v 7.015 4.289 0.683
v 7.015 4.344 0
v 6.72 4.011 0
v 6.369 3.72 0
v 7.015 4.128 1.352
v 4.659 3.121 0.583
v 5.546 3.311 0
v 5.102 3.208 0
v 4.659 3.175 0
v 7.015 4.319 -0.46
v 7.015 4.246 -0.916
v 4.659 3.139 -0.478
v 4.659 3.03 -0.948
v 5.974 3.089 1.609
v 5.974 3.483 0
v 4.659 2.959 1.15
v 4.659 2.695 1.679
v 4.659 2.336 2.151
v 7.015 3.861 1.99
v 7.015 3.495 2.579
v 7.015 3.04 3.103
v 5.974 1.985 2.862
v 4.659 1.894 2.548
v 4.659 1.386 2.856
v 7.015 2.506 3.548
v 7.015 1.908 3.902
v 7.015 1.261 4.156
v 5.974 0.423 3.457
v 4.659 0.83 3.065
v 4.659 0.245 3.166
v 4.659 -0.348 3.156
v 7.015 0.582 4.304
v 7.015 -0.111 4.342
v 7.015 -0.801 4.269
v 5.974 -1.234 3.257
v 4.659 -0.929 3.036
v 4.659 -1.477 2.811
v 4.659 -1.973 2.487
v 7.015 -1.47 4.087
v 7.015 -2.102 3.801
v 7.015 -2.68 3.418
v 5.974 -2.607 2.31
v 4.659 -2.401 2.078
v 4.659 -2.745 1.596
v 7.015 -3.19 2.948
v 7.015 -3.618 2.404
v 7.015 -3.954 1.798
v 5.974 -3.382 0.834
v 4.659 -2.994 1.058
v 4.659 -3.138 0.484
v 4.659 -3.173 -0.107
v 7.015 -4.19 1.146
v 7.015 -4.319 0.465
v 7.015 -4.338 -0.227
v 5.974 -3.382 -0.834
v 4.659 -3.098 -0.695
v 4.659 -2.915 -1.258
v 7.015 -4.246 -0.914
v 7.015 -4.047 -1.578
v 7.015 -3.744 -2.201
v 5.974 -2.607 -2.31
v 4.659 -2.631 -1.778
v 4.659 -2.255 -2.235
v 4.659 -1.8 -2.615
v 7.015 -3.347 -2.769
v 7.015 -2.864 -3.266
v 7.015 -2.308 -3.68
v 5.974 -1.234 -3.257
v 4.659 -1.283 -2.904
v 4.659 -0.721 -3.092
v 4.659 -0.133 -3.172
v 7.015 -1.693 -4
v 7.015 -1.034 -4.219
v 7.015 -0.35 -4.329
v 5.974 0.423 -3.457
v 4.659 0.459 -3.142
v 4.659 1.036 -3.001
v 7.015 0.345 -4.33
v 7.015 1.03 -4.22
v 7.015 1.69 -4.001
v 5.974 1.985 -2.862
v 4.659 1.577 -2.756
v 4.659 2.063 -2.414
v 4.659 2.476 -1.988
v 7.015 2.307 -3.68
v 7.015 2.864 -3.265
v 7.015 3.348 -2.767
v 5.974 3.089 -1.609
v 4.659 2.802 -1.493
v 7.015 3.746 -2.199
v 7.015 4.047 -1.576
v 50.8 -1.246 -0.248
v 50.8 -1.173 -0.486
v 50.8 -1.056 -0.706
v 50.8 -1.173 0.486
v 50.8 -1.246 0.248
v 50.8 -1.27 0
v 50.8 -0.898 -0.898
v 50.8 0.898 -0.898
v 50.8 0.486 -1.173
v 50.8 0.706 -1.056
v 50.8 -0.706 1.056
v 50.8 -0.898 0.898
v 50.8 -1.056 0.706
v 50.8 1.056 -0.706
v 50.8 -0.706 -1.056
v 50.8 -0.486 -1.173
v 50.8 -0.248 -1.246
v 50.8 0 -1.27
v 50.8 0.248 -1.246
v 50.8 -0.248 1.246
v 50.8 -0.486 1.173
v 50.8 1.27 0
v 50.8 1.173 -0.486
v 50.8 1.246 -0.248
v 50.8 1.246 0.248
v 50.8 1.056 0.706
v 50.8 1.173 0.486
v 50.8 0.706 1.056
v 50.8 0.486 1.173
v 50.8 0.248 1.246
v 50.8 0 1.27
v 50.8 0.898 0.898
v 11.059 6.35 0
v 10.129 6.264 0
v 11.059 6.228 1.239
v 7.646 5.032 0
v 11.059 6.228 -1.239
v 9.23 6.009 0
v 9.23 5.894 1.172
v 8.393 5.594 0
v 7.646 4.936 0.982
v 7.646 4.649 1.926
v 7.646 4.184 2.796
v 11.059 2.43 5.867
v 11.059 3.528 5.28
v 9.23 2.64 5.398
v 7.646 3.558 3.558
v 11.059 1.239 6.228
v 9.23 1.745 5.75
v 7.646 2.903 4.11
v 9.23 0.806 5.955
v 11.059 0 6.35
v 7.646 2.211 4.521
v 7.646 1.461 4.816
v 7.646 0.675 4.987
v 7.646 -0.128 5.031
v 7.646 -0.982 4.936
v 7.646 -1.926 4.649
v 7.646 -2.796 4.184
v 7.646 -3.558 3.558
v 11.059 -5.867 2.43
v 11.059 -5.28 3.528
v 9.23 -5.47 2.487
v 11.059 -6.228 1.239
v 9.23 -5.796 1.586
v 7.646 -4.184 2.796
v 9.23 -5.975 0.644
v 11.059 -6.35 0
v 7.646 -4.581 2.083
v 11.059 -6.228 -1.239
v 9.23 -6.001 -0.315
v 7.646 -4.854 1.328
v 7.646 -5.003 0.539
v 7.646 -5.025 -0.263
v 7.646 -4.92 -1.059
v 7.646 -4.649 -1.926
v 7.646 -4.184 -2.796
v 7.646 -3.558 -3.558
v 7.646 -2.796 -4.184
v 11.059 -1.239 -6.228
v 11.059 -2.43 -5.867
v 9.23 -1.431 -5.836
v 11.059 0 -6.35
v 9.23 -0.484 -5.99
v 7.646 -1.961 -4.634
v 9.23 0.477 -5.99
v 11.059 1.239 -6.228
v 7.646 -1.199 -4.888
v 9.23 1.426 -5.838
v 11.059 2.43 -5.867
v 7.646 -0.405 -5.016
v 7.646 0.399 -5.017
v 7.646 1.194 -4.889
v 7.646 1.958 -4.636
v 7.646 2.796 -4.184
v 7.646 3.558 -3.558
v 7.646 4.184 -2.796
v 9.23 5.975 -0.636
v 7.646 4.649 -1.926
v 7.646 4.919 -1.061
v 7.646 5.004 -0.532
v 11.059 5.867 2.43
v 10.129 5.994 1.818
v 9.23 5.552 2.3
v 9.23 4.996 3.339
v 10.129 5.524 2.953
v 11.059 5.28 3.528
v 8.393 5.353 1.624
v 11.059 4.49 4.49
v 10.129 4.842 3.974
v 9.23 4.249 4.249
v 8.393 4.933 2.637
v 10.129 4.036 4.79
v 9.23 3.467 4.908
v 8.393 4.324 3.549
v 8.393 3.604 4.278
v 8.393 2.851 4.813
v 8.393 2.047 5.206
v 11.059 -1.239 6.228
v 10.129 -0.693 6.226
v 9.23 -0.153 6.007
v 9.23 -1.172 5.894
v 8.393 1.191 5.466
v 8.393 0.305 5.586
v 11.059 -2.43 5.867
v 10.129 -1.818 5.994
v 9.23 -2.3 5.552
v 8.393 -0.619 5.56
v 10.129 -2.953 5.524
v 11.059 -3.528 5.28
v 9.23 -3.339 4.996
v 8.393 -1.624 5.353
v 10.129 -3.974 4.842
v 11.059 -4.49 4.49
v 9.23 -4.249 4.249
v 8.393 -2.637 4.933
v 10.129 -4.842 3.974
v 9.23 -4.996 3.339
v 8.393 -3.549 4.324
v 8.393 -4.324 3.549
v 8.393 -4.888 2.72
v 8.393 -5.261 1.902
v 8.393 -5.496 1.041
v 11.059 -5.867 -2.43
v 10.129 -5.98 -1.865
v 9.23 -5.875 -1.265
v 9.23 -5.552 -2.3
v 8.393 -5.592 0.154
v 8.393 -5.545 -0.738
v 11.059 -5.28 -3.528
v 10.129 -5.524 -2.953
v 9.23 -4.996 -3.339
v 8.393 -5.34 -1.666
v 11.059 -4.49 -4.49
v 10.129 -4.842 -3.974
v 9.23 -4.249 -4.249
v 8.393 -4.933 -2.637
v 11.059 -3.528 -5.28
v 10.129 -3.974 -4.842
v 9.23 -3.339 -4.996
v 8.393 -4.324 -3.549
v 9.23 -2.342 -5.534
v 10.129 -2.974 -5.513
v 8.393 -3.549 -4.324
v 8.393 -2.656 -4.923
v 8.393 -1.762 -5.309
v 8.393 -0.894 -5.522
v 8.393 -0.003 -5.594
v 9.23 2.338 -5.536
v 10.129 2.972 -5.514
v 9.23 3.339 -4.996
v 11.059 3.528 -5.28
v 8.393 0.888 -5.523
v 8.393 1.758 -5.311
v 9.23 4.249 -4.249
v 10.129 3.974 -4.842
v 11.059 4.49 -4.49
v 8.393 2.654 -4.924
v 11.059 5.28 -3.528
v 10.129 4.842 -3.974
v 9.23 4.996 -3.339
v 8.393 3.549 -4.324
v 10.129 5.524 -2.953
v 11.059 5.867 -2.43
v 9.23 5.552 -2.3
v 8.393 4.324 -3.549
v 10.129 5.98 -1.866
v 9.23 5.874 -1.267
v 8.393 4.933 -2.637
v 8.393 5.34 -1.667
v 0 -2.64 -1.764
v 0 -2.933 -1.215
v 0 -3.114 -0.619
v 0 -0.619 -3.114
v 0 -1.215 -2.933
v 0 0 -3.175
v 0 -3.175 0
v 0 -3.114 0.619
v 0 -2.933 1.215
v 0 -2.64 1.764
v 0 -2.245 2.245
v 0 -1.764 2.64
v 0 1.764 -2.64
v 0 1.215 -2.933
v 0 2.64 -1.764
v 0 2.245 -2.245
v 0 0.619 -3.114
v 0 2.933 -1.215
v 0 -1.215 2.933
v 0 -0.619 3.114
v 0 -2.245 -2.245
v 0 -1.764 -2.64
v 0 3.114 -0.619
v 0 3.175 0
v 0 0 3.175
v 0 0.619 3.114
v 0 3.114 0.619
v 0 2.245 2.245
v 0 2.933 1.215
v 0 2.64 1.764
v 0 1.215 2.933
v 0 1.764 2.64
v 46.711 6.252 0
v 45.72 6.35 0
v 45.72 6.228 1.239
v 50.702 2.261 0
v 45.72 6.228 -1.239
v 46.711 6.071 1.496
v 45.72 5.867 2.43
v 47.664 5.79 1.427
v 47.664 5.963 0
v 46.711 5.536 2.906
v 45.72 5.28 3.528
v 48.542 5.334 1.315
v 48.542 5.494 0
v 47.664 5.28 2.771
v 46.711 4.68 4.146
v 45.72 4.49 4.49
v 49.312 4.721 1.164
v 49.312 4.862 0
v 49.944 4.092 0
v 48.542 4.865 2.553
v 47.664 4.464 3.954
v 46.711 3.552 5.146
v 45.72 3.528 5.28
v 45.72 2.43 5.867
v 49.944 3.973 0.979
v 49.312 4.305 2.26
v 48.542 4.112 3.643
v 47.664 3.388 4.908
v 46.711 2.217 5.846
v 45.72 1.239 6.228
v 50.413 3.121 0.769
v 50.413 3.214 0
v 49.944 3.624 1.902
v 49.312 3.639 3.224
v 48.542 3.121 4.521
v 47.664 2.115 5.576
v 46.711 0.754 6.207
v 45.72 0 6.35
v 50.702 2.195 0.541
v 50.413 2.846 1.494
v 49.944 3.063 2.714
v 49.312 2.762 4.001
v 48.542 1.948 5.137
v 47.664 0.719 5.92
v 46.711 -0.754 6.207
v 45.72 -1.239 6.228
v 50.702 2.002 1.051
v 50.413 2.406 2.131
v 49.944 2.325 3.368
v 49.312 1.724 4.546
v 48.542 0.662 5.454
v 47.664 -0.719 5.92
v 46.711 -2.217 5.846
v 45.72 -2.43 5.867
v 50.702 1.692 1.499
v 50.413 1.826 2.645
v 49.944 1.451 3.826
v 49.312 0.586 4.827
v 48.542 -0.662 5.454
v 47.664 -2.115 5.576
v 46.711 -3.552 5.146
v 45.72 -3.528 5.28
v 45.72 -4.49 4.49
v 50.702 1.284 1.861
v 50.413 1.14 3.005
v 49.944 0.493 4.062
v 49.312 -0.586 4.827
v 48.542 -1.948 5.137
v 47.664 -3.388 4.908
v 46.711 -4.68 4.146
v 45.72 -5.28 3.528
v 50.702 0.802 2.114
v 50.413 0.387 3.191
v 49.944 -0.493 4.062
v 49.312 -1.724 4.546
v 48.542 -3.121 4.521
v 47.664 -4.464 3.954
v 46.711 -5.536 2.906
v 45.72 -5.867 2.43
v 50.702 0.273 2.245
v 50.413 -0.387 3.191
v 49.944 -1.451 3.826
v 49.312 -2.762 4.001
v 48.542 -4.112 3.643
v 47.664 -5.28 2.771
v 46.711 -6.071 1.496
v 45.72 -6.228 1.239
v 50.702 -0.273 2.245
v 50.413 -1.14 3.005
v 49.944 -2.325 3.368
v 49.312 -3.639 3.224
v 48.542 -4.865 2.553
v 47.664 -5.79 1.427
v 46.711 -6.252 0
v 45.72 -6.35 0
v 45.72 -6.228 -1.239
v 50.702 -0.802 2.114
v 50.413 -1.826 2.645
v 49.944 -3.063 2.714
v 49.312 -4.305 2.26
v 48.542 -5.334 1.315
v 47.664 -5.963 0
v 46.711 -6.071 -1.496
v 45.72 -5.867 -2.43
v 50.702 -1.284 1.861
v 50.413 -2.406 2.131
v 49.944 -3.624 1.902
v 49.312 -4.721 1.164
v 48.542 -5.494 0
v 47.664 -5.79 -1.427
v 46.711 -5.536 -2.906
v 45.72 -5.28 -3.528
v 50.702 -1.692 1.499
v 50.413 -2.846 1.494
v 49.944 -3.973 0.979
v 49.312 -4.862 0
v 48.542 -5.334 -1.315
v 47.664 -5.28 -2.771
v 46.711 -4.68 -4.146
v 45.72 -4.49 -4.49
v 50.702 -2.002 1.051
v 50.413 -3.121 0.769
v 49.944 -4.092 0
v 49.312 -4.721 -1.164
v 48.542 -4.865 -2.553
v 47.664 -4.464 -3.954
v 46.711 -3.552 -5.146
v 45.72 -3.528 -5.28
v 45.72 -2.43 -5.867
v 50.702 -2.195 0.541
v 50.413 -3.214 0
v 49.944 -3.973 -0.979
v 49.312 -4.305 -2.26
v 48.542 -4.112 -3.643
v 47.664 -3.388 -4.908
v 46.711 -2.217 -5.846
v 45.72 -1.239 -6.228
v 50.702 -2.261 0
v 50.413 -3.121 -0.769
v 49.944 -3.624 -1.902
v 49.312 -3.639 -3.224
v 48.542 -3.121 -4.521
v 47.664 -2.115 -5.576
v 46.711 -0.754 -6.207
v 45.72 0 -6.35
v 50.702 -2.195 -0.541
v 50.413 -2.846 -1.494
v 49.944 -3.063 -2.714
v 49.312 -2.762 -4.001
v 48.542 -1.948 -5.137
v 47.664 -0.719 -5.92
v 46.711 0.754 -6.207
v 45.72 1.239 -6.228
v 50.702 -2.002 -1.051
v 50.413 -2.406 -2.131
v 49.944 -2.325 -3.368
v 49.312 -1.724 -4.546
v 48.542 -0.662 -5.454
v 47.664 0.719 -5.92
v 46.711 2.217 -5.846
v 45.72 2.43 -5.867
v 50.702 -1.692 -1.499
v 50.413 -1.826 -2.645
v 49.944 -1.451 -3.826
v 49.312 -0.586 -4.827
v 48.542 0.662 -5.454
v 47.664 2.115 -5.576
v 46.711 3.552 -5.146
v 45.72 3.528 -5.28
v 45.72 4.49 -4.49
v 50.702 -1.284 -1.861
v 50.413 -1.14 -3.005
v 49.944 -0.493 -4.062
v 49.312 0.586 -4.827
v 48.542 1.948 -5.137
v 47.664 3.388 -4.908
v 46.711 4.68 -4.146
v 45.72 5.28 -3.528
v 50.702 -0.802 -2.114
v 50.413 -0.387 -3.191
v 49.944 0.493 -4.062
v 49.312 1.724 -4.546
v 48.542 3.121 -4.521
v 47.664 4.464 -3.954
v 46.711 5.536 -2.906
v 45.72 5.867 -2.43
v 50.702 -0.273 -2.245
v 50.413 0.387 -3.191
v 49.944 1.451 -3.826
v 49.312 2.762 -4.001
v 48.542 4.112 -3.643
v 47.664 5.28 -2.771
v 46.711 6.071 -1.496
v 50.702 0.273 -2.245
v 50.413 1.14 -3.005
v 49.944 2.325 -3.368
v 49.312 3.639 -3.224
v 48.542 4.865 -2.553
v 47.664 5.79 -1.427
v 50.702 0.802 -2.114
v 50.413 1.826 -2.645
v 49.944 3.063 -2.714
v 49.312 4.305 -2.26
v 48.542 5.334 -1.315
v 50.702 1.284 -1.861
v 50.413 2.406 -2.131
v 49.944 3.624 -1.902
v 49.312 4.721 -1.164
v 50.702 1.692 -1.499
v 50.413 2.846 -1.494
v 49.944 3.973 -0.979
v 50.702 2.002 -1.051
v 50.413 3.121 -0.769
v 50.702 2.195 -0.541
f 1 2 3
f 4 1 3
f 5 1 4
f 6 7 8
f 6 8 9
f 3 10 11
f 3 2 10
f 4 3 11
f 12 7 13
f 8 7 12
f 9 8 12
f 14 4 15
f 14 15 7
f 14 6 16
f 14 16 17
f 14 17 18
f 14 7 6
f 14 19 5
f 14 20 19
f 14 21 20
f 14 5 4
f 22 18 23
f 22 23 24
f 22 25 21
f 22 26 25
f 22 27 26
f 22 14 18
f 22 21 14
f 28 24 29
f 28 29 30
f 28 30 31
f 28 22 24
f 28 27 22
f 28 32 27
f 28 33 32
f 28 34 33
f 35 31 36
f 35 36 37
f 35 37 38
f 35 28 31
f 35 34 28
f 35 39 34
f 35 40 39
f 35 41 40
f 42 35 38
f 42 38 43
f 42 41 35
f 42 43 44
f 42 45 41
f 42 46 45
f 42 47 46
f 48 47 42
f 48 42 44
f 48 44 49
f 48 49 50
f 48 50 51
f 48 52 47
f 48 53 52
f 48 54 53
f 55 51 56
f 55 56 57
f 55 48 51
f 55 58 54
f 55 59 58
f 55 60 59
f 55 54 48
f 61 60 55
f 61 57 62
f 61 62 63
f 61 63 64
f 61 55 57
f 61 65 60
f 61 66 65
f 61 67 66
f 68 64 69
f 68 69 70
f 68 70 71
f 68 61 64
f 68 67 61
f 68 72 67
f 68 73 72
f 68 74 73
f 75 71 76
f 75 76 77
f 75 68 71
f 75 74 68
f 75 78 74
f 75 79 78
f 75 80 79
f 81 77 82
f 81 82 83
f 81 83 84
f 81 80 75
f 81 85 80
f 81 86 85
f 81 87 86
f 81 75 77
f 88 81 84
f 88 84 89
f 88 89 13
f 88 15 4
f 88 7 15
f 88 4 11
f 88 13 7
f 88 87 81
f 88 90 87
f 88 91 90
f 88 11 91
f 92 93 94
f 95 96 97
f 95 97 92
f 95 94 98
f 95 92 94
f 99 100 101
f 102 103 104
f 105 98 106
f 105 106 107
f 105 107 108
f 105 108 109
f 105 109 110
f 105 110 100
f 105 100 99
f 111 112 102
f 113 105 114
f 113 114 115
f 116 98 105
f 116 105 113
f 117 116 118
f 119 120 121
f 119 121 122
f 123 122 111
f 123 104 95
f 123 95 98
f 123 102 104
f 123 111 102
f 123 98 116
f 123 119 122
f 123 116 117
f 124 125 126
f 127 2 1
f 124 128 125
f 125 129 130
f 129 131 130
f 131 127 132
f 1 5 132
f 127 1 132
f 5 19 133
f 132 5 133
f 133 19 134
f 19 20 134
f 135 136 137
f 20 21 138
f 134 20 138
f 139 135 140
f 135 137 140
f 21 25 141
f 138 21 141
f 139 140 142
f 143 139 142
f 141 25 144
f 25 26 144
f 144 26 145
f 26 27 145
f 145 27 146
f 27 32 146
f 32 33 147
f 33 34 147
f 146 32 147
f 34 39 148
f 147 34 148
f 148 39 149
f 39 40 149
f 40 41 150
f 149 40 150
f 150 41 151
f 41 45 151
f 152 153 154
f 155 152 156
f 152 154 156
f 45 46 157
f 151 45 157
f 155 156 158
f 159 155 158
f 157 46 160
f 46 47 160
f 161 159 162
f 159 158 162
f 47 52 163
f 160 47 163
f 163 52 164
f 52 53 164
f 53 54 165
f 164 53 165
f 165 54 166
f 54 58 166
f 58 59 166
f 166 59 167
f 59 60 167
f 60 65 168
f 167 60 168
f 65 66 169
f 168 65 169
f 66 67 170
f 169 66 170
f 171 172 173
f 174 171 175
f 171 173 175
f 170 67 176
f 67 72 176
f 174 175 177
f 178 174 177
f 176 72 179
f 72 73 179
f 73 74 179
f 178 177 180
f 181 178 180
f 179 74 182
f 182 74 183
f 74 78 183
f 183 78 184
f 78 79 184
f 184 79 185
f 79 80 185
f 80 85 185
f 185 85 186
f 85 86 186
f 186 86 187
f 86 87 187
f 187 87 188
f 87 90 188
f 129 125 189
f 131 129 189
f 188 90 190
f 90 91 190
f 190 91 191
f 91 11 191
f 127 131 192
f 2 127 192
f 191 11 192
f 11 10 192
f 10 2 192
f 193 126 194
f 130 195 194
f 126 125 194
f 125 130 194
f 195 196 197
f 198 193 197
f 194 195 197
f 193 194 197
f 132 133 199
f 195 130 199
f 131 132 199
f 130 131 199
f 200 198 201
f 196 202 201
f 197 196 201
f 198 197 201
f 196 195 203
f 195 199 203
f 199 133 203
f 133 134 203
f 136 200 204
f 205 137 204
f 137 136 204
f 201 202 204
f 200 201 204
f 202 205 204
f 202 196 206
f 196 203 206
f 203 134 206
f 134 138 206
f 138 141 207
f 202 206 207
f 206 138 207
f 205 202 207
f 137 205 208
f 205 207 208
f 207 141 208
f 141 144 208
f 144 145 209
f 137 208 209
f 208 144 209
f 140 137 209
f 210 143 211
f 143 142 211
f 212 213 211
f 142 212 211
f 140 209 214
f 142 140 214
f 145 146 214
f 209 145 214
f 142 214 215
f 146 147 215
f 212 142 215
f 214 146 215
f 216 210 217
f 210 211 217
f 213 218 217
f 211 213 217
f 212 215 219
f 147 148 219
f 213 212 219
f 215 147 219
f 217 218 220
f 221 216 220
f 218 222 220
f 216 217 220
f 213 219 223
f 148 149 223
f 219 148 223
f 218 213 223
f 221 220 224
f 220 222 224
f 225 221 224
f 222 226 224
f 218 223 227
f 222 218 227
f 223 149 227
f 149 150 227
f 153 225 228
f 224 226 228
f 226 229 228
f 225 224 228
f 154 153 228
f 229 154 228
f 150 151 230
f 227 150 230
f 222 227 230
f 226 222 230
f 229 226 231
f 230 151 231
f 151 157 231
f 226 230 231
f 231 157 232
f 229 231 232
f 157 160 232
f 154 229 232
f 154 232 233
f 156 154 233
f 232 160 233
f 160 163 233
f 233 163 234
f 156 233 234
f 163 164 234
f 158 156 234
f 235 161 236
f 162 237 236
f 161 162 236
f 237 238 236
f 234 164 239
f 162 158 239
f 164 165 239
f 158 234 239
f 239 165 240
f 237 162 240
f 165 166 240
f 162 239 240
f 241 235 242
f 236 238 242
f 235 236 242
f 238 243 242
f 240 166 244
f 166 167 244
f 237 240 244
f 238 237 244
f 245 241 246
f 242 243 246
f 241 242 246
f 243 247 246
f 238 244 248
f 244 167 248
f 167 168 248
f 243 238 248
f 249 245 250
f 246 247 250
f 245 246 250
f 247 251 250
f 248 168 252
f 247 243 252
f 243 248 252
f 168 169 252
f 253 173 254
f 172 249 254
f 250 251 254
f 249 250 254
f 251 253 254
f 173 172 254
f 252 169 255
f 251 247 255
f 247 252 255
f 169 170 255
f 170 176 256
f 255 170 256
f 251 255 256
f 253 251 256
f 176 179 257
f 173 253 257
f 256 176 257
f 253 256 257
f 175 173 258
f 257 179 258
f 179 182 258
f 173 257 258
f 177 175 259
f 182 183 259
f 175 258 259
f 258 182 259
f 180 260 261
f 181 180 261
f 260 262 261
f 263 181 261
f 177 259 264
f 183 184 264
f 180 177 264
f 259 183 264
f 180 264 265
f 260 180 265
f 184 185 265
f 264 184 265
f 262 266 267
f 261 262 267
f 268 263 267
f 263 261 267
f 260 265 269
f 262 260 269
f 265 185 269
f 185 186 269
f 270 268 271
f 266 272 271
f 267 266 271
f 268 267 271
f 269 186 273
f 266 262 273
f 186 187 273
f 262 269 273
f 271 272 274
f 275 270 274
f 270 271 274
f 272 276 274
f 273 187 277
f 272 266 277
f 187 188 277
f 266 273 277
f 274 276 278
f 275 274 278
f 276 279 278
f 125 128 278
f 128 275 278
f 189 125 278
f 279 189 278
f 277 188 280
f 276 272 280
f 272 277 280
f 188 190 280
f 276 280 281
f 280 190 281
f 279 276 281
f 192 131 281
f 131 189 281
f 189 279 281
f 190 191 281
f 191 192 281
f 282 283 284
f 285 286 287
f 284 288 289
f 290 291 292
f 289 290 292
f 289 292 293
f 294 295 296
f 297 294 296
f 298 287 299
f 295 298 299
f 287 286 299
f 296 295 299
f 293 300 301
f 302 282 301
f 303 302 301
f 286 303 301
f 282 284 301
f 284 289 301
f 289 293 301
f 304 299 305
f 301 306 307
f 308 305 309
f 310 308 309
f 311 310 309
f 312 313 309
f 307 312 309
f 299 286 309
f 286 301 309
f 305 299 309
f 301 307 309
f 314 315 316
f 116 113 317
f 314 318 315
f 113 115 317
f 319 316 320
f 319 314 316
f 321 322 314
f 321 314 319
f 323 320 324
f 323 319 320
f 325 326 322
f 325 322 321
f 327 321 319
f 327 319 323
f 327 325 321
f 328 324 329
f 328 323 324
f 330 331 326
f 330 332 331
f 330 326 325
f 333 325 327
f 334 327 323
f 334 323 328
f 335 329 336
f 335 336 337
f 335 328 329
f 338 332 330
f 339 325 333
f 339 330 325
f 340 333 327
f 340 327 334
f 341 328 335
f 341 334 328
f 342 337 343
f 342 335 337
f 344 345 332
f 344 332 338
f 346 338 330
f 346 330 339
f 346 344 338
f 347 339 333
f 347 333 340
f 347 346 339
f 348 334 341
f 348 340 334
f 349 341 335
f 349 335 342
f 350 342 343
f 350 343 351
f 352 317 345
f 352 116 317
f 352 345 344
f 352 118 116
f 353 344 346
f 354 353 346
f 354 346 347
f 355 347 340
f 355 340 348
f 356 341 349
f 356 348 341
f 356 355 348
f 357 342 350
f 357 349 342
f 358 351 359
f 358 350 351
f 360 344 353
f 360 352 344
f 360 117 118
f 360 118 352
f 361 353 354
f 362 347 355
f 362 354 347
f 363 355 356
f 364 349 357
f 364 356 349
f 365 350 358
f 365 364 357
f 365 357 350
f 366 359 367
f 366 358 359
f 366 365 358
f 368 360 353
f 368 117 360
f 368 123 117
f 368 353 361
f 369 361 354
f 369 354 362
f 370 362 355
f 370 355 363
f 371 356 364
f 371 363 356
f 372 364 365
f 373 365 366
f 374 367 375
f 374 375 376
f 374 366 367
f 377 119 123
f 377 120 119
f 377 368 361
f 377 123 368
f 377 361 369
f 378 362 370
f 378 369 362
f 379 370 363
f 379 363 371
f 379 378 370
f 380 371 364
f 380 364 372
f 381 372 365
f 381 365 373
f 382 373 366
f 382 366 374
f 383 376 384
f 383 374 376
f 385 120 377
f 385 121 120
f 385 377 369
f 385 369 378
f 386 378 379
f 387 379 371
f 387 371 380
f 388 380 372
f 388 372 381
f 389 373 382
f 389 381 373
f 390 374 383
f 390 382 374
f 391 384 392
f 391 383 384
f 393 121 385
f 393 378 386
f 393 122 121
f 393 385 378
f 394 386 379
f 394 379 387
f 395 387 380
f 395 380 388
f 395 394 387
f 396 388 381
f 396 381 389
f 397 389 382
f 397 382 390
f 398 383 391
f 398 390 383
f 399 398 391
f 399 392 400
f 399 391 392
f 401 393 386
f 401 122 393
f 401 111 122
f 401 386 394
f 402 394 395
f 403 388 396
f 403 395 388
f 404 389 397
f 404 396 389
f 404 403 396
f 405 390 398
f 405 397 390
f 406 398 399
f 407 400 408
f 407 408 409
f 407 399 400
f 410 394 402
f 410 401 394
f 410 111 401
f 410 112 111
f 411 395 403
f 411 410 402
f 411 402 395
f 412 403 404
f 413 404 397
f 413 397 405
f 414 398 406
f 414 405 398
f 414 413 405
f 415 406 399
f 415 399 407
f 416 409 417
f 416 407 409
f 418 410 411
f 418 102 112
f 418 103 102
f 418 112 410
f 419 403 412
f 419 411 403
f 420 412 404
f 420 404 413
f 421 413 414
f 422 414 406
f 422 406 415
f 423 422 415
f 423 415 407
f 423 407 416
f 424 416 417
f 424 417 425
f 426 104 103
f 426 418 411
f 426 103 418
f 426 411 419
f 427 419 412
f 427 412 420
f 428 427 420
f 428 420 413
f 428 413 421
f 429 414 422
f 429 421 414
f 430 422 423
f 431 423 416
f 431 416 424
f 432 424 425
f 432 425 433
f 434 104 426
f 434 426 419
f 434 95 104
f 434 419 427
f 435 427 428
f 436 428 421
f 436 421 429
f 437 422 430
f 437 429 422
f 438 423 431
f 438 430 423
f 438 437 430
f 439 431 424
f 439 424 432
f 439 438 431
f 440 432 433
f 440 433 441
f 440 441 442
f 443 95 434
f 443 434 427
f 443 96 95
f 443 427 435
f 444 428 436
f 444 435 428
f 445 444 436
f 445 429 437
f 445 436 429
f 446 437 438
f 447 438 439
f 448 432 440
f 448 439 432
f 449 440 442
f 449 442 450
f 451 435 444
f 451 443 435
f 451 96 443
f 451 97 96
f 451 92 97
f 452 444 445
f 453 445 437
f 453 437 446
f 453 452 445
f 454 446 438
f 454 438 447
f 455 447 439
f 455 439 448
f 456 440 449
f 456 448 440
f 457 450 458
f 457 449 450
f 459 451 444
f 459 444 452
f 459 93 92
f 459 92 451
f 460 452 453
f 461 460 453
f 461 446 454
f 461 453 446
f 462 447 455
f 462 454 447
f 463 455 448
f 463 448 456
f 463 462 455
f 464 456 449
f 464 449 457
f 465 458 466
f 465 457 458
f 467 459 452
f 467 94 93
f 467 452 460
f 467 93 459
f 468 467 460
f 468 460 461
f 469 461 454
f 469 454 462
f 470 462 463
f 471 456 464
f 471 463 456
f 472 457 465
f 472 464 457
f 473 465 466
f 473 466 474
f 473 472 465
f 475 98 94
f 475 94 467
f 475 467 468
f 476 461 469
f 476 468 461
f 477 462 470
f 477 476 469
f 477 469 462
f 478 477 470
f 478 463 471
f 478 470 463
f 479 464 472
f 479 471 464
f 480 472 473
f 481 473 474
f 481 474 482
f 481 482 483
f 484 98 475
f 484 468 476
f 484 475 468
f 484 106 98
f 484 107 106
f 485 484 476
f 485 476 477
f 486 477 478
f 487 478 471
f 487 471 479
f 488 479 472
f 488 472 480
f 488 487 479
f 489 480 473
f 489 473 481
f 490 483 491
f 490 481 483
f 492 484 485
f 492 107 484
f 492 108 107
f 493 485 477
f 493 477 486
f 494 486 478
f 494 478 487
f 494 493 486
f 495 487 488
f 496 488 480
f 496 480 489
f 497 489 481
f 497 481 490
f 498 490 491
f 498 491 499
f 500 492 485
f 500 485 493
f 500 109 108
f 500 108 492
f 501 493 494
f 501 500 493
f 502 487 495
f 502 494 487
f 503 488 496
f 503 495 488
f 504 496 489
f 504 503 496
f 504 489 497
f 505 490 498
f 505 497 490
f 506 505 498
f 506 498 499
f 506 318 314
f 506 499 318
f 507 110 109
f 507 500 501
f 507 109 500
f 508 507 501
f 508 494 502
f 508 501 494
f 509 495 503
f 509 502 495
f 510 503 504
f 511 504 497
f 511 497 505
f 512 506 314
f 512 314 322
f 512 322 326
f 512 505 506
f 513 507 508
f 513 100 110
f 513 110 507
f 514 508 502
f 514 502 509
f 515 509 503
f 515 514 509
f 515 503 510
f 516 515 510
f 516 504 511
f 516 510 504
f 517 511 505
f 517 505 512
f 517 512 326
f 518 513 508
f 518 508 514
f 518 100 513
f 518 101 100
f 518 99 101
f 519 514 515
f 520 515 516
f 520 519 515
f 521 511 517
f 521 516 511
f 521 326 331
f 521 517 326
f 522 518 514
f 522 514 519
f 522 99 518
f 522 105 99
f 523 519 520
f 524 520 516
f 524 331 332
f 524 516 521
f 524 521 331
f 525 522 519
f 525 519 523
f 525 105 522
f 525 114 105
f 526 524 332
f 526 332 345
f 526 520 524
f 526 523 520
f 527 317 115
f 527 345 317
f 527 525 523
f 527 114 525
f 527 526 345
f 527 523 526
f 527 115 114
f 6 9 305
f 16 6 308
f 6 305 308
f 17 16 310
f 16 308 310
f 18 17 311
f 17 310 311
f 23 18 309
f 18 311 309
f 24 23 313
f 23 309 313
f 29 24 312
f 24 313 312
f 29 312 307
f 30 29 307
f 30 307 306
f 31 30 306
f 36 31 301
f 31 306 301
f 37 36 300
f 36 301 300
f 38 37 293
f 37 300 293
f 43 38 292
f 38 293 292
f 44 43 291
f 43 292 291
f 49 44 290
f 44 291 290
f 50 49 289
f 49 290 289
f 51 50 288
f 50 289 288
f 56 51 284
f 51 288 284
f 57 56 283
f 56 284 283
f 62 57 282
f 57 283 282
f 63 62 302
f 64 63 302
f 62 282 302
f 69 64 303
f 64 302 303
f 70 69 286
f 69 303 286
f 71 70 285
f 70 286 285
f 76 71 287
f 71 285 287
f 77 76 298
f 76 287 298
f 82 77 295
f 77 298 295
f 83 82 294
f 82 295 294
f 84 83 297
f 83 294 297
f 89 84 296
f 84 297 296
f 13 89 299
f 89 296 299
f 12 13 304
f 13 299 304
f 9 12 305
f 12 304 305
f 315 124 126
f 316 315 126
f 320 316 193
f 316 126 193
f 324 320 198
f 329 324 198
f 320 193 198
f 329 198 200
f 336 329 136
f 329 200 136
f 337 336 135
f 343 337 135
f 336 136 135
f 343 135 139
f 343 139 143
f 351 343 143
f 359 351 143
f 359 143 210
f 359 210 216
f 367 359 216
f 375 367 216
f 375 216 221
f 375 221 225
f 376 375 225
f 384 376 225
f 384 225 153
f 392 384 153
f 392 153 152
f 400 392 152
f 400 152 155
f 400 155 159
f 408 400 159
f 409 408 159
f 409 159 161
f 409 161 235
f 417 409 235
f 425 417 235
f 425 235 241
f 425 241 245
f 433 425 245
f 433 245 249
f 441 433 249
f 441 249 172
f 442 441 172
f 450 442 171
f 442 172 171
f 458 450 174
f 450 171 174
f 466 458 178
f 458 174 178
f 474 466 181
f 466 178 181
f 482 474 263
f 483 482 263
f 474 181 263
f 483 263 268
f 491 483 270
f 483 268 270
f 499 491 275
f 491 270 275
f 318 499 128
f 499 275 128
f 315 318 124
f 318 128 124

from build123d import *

# Parameters (mm, degrees)
F0_R     = 3.175
F1_DEPTH = 6.35
F2_R     = 6.35
F3_DEPTH = 44.45
F4_R     = 5.08
F6_R     = 2.9585715778


# Not quite as in the source:
# - a fillet or chamfer that OpenCascade refuses, or shapes differently, is made with other operations: its cross-section is extruded or revolved along the edge and cut away or added


with BuildPart() as f1:
    # F0 (on Right) → F1 (new body)
    with BuildSketch(Plane.YZ):
        Circle(F0_R)
    extrude(amount=F1_DEPTH)

    # F2 (on face) → F3 (join)
    with BuildSketch(Plane.YZ.offset(6.35)):
        Circle(F2_R)
    extrude(amount=F3_DEPTH)

    # F4
    f4_edges = [f1.edges().sort_by_distance(p)[0] for p in [
        (50.8, -6.35, 0),
    ]]
    fillet(f4_edges, radius=F4_R)

    # F5: fillet of radius 5.08 on 1 edges, made by hand

    # F5_s1 → F5_t2 (revolve, cut)
    with BuildSketch(Plane.XY):
        with BuildLine():
            ThreePointArc((11.0592860393, 6.35), (8.2194797079, 5.4821134838), (6.35, 3.175))
            Line((6.35, 3.175), (6.35, 6.35))
            Line((6.35, 6.35), (11.0592860393, 6.35))
        make_face()
    revolve(axis=Axis((6.35, 0, 0), (1, 0, 0)), mode=Mode.SUBTRACT)

    # F6
    f6_edges = [f1.edges().sort_by_distance(p)[0] for p in [
        (6.35, -3.175, 0),
    ]]
    fillet(f6_edges, radius=F6_R)


solid = f1.part
